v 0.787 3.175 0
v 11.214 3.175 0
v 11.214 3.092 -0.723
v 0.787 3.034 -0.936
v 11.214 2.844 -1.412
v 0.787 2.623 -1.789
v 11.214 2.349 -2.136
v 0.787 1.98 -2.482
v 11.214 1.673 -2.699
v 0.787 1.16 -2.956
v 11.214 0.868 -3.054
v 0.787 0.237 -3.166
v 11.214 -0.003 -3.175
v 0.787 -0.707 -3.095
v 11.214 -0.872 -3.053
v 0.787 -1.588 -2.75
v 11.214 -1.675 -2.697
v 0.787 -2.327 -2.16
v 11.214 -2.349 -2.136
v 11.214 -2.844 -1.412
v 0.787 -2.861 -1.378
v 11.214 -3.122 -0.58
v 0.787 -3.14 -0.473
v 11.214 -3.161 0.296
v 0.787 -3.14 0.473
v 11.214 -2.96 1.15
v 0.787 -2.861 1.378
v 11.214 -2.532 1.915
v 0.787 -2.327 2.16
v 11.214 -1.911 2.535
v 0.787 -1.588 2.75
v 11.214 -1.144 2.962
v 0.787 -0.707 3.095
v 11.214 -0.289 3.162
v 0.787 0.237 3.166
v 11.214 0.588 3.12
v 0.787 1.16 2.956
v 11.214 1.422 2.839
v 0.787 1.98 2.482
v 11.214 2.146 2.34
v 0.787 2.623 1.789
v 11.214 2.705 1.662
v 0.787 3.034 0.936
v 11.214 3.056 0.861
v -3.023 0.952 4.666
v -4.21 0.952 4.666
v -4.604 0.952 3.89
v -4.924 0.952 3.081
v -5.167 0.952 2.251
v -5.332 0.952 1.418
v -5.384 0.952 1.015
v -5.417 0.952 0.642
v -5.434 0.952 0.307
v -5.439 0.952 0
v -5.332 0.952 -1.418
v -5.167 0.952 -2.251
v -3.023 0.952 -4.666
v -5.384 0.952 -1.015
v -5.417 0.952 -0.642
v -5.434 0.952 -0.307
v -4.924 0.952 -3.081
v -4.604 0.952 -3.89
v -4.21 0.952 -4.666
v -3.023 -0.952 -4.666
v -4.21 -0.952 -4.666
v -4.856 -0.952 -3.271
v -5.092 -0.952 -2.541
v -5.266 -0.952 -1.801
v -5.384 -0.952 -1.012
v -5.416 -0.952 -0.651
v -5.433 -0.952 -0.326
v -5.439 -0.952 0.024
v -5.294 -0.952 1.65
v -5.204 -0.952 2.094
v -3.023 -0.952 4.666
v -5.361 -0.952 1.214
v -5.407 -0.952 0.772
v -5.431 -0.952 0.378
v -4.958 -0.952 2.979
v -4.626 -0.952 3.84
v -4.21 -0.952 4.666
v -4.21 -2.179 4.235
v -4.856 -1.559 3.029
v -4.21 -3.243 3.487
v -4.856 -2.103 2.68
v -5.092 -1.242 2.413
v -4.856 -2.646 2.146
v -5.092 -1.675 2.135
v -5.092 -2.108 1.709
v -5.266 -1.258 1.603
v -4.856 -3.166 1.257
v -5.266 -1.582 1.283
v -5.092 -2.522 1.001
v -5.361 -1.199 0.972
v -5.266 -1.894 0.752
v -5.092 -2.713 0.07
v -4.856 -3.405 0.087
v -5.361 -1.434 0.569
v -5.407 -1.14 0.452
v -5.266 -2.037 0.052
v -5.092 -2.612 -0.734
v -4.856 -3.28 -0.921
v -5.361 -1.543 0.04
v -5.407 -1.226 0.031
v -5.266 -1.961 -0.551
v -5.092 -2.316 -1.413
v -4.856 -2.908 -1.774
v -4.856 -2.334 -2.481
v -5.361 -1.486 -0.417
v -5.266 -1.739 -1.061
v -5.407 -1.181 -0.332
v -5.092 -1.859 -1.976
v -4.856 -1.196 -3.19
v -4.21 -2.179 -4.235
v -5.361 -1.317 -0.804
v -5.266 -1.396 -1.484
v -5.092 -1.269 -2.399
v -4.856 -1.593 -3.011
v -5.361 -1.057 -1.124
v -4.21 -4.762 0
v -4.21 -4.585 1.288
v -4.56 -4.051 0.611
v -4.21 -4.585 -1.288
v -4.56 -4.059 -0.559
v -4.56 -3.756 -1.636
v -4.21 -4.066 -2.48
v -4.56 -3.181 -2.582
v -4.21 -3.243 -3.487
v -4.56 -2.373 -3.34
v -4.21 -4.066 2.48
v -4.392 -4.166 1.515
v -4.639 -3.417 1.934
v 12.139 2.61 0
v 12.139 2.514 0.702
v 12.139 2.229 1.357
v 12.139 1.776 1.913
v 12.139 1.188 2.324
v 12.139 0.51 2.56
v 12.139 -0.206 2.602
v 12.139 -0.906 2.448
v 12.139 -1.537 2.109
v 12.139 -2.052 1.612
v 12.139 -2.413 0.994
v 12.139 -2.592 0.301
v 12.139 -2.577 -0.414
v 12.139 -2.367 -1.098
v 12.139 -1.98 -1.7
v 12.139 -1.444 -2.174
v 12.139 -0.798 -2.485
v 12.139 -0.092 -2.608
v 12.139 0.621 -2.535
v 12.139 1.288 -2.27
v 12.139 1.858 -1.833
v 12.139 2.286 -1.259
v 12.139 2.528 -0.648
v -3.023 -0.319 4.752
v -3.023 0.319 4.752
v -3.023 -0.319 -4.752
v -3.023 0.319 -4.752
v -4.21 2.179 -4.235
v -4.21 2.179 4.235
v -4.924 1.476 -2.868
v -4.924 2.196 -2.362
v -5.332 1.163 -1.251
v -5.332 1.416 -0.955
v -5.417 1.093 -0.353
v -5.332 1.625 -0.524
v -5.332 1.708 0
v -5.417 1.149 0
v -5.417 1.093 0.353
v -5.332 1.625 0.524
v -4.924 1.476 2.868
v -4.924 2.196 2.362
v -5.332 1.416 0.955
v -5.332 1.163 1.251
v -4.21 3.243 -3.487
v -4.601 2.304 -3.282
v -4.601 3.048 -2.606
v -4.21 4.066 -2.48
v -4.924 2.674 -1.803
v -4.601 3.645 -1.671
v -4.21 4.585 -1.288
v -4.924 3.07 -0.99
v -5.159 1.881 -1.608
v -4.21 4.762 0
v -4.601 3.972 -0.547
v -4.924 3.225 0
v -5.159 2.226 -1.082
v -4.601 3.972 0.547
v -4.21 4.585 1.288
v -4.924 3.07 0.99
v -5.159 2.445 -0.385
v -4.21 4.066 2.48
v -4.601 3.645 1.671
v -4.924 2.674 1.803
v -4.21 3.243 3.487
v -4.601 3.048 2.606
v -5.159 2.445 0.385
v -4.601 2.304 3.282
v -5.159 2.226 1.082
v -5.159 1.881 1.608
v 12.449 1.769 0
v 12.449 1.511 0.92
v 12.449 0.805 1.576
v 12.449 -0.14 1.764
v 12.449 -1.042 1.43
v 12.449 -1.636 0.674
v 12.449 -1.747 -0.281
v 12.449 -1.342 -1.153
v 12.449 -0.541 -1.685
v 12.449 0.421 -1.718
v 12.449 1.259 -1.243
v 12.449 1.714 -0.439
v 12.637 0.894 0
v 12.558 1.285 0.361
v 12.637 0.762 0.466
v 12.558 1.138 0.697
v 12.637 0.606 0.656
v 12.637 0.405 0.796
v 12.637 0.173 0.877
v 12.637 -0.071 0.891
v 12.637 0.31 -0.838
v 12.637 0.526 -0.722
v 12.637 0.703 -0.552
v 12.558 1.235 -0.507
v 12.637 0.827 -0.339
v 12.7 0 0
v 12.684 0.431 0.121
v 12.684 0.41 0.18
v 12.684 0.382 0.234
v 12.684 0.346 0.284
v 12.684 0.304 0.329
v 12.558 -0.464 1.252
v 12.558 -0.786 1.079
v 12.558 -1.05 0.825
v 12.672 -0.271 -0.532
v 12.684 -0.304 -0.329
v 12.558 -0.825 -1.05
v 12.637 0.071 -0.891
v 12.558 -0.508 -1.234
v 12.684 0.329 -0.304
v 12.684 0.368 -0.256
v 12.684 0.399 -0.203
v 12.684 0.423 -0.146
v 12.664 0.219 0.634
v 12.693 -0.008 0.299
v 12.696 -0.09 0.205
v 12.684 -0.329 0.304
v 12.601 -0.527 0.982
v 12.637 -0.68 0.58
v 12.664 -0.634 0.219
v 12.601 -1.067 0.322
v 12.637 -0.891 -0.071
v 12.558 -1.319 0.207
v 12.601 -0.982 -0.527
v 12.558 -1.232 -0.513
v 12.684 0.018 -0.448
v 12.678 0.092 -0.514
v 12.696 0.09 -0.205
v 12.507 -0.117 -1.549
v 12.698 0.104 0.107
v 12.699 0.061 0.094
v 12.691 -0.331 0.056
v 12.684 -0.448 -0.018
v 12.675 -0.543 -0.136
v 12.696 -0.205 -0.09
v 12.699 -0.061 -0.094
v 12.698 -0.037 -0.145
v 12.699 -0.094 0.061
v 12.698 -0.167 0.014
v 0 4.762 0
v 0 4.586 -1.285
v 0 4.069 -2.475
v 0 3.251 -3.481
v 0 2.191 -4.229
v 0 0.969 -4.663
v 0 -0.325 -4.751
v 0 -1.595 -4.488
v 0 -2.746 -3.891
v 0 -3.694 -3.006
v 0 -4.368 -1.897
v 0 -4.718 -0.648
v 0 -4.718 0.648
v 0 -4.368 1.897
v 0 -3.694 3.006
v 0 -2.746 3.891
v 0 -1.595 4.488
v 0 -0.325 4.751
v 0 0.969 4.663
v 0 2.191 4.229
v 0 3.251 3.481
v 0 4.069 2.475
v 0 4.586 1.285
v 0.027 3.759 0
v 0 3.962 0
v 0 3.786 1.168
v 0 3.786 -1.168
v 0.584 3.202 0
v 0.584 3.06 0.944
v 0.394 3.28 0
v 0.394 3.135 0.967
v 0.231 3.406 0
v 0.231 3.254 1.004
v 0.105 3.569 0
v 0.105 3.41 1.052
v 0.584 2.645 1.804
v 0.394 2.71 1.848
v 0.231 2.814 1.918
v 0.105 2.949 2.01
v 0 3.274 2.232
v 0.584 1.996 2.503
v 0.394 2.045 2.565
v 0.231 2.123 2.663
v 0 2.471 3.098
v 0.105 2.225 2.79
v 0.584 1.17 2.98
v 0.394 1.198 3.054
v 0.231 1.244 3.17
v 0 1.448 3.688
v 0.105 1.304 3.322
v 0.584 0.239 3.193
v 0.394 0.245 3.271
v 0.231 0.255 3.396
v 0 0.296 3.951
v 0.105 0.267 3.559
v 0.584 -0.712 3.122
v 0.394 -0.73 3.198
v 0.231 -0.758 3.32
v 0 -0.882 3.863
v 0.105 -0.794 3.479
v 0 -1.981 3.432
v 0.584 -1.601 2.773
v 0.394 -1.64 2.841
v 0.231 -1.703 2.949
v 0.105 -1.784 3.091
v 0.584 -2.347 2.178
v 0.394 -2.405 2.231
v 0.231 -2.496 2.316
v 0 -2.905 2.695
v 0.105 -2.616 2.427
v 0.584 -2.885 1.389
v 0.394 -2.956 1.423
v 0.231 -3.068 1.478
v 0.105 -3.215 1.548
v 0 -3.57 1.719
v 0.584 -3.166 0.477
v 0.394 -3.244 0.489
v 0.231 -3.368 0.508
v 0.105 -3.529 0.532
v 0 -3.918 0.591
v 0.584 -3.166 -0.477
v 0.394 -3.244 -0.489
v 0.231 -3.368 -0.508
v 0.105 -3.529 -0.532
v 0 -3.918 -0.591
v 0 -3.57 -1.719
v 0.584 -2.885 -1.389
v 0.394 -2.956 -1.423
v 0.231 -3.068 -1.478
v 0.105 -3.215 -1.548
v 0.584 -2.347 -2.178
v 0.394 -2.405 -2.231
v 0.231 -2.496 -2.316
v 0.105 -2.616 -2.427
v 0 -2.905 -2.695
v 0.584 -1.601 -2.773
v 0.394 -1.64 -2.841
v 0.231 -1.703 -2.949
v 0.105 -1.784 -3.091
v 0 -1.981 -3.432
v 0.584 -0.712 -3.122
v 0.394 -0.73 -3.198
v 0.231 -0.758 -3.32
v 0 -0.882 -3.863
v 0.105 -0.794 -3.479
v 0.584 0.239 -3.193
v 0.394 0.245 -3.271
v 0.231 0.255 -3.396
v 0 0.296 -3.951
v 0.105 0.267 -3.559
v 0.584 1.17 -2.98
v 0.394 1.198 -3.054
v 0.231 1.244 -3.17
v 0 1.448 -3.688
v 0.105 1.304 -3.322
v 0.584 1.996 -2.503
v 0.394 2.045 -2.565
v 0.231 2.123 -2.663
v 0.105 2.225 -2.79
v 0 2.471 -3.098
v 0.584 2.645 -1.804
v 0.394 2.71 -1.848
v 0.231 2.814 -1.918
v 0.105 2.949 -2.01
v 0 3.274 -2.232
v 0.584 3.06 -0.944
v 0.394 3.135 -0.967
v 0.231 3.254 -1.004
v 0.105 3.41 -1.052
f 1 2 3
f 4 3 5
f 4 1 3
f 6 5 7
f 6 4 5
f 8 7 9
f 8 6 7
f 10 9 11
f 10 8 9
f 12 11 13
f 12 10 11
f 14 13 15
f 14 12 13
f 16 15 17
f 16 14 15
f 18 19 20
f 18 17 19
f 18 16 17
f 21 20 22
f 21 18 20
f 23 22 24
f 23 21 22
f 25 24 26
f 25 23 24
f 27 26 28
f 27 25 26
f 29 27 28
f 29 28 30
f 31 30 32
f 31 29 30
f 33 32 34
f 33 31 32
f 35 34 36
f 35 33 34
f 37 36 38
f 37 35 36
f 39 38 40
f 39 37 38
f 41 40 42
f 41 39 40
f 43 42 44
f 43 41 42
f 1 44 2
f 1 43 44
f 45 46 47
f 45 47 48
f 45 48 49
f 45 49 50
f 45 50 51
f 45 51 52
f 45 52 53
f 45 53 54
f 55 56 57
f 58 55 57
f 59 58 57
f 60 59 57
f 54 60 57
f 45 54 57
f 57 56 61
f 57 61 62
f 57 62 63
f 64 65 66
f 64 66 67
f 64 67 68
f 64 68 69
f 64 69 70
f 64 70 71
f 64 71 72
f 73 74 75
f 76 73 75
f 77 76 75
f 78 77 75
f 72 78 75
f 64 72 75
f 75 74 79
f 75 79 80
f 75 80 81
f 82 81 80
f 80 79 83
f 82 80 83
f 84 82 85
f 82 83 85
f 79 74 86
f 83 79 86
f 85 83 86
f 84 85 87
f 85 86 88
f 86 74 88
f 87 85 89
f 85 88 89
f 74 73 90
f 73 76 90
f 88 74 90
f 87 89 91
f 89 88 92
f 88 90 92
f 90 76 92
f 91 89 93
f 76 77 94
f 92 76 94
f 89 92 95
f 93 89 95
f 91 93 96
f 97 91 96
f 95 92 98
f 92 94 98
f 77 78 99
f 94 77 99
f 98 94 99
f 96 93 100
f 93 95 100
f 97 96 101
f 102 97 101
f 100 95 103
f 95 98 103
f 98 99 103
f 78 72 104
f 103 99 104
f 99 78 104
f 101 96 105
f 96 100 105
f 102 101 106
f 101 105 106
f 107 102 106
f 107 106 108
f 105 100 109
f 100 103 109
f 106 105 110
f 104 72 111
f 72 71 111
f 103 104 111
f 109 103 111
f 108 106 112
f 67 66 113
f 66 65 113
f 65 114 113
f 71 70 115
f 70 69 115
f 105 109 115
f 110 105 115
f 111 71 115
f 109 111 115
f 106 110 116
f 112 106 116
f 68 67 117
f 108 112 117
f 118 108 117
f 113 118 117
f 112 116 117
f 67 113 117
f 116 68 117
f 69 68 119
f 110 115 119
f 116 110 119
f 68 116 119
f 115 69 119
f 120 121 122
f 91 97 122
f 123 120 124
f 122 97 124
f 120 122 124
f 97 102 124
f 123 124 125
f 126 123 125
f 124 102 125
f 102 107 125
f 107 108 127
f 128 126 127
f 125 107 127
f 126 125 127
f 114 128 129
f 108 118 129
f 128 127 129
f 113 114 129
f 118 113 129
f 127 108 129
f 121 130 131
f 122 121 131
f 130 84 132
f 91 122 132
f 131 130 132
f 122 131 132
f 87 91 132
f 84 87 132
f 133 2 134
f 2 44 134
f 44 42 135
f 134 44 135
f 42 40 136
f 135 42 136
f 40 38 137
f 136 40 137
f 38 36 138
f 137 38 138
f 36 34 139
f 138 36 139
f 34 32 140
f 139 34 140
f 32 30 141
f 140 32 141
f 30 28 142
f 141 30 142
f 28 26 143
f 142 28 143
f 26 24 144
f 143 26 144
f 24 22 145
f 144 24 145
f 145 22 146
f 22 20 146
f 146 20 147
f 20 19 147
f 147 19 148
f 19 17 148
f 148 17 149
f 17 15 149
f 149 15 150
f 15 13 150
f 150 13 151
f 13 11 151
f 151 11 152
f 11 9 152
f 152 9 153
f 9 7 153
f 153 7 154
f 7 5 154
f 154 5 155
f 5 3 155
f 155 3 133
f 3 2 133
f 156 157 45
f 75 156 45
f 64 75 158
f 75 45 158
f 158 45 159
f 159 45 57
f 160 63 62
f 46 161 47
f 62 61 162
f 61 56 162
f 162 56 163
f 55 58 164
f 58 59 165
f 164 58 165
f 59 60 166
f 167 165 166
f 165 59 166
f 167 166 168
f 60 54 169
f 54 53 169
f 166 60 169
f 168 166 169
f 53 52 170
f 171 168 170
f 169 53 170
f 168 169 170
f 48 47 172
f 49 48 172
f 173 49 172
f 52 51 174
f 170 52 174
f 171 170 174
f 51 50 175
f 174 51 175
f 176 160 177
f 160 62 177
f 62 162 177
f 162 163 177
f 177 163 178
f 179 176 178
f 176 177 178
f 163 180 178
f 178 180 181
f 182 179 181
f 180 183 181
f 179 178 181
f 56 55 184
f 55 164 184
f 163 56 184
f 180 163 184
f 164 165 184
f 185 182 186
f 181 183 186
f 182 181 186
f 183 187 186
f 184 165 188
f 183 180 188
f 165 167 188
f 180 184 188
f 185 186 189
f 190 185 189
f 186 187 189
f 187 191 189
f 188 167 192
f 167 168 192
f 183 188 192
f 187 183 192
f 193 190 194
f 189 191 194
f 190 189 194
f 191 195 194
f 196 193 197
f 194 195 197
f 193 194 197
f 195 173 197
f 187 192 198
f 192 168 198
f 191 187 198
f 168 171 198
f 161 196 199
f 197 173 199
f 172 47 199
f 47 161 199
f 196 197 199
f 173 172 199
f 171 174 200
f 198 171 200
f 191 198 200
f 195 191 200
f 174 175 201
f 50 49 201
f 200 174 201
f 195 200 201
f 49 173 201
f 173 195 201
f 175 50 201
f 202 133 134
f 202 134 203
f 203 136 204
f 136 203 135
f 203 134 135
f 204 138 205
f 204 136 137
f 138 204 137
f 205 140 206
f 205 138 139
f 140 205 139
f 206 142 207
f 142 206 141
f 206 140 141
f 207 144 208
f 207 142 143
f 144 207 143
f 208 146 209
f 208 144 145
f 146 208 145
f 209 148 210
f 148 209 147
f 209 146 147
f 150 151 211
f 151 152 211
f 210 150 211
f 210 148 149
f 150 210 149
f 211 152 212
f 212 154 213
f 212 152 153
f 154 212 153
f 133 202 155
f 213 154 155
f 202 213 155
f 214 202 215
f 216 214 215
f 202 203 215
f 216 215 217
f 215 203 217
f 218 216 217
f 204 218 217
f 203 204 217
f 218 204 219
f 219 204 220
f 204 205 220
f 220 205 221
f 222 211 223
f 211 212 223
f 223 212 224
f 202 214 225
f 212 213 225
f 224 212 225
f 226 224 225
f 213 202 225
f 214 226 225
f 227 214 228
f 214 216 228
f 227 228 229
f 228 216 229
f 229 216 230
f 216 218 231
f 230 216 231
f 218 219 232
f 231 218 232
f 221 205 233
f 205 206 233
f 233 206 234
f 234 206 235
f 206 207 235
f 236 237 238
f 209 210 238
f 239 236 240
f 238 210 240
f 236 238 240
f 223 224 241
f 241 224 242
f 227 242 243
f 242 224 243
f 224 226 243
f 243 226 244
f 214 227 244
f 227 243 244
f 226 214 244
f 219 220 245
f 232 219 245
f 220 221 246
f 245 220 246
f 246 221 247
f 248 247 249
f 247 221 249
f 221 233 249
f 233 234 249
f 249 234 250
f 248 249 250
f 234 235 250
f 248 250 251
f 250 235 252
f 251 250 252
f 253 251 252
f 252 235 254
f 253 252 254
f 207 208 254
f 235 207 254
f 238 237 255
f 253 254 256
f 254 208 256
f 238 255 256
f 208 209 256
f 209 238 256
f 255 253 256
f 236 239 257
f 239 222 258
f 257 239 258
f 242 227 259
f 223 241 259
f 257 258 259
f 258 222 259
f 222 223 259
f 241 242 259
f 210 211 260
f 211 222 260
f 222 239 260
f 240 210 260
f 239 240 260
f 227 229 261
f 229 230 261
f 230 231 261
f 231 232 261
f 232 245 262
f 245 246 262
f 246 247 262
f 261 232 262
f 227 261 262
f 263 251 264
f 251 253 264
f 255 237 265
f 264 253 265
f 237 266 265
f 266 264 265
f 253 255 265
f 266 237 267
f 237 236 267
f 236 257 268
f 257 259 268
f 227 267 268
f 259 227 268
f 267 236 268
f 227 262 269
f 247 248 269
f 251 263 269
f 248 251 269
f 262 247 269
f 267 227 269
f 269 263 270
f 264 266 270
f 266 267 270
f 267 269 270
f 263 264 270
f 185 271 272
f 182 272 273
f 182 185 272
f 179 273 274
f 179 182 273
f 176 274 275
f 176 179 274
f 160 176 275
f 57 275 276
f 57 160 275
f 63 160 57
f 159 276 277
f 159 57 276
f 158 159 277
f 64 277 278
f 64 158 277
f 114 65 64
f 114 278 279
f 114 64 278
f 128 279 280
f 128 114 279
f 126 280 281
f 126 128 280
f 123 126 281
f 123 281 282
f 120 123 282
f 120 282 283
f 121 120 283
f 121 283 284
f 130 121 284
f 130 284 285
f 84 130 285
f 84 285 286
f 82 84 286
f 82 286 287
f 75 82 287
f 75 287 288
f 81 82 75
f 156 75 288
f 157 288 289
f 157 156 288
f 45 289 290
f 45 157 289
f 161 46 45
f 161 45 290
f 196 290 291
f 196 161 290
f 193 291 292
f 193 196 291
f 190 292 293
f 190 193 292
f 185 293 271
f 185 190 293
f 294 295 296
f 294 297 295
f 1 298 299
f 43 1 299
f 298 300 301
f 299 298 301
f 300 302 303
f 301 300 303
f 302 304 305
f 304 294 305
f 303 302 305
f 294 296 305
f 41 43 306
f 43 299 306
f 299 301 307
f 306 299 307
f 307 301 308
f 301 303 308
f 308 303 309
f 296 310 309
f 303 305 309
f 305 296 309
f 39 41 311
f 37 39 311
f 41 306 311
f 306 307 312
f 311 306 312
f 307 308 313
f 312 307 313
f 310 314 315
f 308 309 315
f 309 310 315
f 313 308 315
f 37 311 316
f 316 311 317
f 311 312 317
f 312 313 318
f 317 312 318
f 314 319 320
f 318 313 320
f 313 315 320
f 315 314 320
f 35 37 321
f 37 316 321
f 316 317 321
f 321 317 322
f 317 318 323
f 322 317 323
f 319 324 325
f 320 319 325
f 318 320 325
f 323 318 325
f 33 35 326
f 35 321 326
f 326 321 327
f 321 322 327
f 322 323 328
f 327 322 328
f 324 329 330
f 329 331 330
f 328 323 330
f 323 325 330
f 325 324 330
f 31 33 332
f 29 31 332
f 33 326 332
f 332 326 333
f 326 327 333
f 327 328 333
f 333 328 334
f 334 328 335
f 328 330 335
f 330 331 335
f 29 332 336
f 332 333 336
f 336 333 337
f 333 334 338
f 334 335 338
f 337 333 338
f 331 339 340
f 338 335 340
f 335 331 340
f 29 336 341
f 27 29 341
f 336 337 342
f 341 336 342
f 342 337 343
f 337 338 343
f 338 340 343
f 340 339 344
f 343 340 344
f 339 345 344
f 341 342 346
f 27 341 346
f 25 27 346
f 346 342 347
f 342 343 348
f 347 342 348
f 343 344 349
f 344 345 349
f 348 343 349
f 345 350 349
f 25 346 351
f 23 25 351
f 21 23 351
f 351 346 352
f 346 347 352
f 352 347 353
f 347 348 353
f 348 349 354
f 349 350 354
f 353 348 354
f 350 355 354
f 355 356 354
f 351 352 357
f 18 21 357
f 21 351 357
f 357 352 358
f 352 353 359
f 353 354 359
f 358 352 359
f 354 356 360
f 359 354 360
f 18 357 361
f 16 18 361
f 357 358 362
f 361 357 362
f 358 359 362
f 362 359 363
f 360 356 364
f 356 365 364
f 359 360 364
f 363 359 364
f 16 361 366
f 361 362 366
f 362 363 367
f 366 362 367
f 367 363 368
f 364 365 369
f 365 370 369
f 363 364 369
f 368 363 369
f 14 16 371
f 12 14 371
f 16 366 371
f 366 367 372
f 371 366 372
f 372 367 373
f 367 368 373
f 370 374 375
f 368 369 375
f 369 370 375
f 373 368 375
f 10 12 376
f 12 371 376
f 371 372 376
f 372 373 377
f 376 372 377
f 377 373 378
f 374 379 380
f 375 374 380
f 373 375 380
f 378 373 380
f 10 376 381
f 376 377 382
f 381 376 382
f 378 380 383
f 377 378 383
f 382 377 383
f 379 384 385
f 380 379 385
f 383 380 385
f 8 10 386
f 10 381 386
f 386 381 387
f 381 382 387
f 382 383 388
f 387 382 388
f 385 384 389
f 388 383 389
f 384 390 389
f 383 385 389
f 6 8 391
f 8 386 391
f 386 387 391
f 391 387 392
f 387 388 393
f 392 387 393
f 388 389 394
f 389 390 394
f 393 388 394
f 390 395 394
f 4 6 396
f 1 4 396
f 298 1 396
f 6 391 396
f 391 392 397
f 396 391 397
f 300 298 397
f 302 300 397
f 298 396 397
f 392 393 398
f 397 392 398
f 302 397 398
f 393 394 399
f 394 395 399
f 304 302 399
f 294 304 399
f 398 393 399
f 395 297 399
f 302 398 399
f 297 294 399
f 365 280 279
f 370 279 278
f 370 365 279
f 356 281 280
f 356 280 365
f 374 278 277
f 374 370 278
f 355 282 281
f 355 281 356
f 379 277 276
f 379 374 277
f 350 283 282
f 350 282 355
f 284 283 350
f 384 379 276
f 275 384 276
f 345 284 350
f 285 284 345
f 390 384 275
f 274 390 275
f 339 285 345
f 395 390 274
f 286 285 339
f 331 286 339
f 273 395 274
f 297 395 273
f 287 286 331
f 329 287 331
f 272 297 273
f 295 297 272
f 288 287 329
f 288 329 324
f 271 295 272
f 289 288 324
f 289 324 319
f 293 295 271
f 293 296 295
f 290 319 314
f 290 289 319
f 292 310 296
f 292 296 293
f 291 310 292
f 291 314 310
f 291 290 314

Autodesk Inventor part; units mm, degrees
ref_plane "YZ Plane" through (0, 0, 0) normal (1, 0, 0) x (0, 1, 0)
sketch "Sketch1" plane through (0, 0, 0) normal (0, 0, 1) x (1, 0, 0)
  line L0 (-5.4864, 0) -> (12.7, 0)
  line L1 (12.7, 0) -> (12.7, 3.175)
  line L2 (12.7, 3.175) -> (3.175, 3.175)
  line L3 (3.175, 3.175) -> (2.413, 3.175)
  line L4 (2.413, 3.175) -> (0, 3.175)
  line L5 (0, 3.175) -> (0, 4.7625)
  line L6 (-9.4999, 0) -> (16.4, 0) projected
  line L7 (0, -0.9693) -> (0, 5.8158) projected
  line L8 (0, 4.7625) -> (-4.2103, 4.7625)
  arc A0 (-4.2103, 4.7625) -> (-5.4864, 0) centre (4.0386, 0) ccw
  line L9 (3.175, 3.175) -> (0, 3.175) construction
  dimension "d0" = 12.7
  dimension "d1" = 9.525
  dimension "d2" = 0.762
  dimension "d3" = 5.4864
  dimension "d4" = 6.35
  dimension "d5" = 6.35
  dimension "d9" = 9.525
  dimension "d10" = 0
  dimension "d13" = 9.525
revolve "Body" add sketch "Sketch1" angle 360 about axis through (-5.4864, 0, 0) along (1, 0, 0)
ref_plane "IDS_WORKPLANE{1}" through (-5.4864, 0, 0) normal (1, 0, 0) x (0, 0, -1)
sketch "Sketch2" plane through (-5.4864, 0, 0) normal (1, 0, 0) x (0, 0, -1)
  circle A0 centre (0, 0) radius 4.7625 projected
  line L0 (0, -6.6675) -> (0, 6.6675) projected
  line L1 (6.6675, 0) -> (-6.6675, 0) projected
  line L2 (-4.7625, 0.9525) -> (4.7625, 0.9525)
  line L3 (4.7625, 0.9525) -> (4.7625, -0.9525)
  line L4 (4.7625, -0.9525) -> (-4.7625, -0.9525)
  line L5 (-4.7625, -0.9525) -> (-4.7625, 0.9525)
  line L6 (-4.7625, 0) -> (4.7625, 0) construction
  line L7 (0, 0.9525) -> (0, -0.9525) construction
  dimension "d15" = 1.905
extrude "Slot" cut sketch "Sketch2" along normal blind 2.4638 contours L1 L0 L2 A0 | L3 L4 A0 | A0 L4 L0 L1 | A0 L2 L3 | L1 A0 L2 L0 | L0 L4 A0 L1 | L5 L2 A0 | A0 L4 L5
thread "Thread" size "1/4-20 UNC" class "2A" standard "ANSI Unified Screw Threads" length 9.525
sketch "Sketch3" plane through (0, 0, 0) normal (0, 0, 1) x (1, 0, 0)
  line L0 (12.7, 0) -> (12.7, 3.175) projected
  line L1 (12.7, 3.175) -> (3.175, 3.175) projected
  line L2 (-5.4864, 0) -> (12.7, 0) projected
  arc A0 (12.7, 0) -> (11.8493, 3.175) centre (6.35, 0) ccw
  line L3 (12.7, -3.175) -> (12.7, 3.175) projected
  line L4 (11.8493, 3.175) -> (11.8493, 0)
  line L5 (11.8493, 0) -> (12.7, 0)
  dimension "d40" = 6.35
revolve "Fillet1" cut sketch "Sketch3" angle 360 about axis through (-5.4864, 0, 0) along (1, 0, 0) contours A0 L1 L0
chamfer "Chamfer" distance 0.635 angle 45 1 edges at (11.8493, -3.175, 0)
ref_plane "Work Plane2" through (41.275, 0, 0) normal (0, 0, -1) x (1, 0, 0)
fillet "Fillet4" radius 0.7874 1 edges at (0, -3.175, 0)
equation "\"d0\" = NLG"
equation "\"d1\" = GEL"
equation "\"d2\" = GAL"
equation "\"d3\" = KOH"
equation "\"d4\" = GD"
equation "\"d5\" = BDM"
equation "\"d9\" = KOD"
equation "\"d13\" = KR"
equation "\"d15\" = SBR"
equation "\"d16\" = STI"
equation "\"d40\" = GD"
equation "\"d46\" = R"
equation "\"d11\" = GEL"
equation "\"d43\" = 0.5 * RR"
equation "\"GD\" = NND"
equation "\"NLG\" = 12.7"
equation "\"GEL\" = 9.525"
equation "\"KOD\" = 9.525"
equation "\"KOH\" = 5.4864"
equation "\"GAL\" = 0.762"
equation "\"BDM\" = NND"
equation "\"SBR\" = 1.905"
equation "\"STI\" = 2.4638"
equation "\"KEWI\" = 0"
equation "\"KR\" = KOD"
equation "\"d14\" = -KOH"
equation "\"R\" = 0.7874"
equation "\"THREADDIA\" = 6.35"
equation "\"TOA\" = 30deg"
equation "\"KOH1\" = 4.3688"
equation "\"NND\" = 6.35"
equation "\"GD1\" = 4.8387"
equation "\"THREADDESC\" = 1.2345"
equation "\"RR\" = 1.27"
properties part number "ANSI B18.6.2 - 1/4-20 UNC - 0.5, SFHCSI" material "Steel, Mild"
